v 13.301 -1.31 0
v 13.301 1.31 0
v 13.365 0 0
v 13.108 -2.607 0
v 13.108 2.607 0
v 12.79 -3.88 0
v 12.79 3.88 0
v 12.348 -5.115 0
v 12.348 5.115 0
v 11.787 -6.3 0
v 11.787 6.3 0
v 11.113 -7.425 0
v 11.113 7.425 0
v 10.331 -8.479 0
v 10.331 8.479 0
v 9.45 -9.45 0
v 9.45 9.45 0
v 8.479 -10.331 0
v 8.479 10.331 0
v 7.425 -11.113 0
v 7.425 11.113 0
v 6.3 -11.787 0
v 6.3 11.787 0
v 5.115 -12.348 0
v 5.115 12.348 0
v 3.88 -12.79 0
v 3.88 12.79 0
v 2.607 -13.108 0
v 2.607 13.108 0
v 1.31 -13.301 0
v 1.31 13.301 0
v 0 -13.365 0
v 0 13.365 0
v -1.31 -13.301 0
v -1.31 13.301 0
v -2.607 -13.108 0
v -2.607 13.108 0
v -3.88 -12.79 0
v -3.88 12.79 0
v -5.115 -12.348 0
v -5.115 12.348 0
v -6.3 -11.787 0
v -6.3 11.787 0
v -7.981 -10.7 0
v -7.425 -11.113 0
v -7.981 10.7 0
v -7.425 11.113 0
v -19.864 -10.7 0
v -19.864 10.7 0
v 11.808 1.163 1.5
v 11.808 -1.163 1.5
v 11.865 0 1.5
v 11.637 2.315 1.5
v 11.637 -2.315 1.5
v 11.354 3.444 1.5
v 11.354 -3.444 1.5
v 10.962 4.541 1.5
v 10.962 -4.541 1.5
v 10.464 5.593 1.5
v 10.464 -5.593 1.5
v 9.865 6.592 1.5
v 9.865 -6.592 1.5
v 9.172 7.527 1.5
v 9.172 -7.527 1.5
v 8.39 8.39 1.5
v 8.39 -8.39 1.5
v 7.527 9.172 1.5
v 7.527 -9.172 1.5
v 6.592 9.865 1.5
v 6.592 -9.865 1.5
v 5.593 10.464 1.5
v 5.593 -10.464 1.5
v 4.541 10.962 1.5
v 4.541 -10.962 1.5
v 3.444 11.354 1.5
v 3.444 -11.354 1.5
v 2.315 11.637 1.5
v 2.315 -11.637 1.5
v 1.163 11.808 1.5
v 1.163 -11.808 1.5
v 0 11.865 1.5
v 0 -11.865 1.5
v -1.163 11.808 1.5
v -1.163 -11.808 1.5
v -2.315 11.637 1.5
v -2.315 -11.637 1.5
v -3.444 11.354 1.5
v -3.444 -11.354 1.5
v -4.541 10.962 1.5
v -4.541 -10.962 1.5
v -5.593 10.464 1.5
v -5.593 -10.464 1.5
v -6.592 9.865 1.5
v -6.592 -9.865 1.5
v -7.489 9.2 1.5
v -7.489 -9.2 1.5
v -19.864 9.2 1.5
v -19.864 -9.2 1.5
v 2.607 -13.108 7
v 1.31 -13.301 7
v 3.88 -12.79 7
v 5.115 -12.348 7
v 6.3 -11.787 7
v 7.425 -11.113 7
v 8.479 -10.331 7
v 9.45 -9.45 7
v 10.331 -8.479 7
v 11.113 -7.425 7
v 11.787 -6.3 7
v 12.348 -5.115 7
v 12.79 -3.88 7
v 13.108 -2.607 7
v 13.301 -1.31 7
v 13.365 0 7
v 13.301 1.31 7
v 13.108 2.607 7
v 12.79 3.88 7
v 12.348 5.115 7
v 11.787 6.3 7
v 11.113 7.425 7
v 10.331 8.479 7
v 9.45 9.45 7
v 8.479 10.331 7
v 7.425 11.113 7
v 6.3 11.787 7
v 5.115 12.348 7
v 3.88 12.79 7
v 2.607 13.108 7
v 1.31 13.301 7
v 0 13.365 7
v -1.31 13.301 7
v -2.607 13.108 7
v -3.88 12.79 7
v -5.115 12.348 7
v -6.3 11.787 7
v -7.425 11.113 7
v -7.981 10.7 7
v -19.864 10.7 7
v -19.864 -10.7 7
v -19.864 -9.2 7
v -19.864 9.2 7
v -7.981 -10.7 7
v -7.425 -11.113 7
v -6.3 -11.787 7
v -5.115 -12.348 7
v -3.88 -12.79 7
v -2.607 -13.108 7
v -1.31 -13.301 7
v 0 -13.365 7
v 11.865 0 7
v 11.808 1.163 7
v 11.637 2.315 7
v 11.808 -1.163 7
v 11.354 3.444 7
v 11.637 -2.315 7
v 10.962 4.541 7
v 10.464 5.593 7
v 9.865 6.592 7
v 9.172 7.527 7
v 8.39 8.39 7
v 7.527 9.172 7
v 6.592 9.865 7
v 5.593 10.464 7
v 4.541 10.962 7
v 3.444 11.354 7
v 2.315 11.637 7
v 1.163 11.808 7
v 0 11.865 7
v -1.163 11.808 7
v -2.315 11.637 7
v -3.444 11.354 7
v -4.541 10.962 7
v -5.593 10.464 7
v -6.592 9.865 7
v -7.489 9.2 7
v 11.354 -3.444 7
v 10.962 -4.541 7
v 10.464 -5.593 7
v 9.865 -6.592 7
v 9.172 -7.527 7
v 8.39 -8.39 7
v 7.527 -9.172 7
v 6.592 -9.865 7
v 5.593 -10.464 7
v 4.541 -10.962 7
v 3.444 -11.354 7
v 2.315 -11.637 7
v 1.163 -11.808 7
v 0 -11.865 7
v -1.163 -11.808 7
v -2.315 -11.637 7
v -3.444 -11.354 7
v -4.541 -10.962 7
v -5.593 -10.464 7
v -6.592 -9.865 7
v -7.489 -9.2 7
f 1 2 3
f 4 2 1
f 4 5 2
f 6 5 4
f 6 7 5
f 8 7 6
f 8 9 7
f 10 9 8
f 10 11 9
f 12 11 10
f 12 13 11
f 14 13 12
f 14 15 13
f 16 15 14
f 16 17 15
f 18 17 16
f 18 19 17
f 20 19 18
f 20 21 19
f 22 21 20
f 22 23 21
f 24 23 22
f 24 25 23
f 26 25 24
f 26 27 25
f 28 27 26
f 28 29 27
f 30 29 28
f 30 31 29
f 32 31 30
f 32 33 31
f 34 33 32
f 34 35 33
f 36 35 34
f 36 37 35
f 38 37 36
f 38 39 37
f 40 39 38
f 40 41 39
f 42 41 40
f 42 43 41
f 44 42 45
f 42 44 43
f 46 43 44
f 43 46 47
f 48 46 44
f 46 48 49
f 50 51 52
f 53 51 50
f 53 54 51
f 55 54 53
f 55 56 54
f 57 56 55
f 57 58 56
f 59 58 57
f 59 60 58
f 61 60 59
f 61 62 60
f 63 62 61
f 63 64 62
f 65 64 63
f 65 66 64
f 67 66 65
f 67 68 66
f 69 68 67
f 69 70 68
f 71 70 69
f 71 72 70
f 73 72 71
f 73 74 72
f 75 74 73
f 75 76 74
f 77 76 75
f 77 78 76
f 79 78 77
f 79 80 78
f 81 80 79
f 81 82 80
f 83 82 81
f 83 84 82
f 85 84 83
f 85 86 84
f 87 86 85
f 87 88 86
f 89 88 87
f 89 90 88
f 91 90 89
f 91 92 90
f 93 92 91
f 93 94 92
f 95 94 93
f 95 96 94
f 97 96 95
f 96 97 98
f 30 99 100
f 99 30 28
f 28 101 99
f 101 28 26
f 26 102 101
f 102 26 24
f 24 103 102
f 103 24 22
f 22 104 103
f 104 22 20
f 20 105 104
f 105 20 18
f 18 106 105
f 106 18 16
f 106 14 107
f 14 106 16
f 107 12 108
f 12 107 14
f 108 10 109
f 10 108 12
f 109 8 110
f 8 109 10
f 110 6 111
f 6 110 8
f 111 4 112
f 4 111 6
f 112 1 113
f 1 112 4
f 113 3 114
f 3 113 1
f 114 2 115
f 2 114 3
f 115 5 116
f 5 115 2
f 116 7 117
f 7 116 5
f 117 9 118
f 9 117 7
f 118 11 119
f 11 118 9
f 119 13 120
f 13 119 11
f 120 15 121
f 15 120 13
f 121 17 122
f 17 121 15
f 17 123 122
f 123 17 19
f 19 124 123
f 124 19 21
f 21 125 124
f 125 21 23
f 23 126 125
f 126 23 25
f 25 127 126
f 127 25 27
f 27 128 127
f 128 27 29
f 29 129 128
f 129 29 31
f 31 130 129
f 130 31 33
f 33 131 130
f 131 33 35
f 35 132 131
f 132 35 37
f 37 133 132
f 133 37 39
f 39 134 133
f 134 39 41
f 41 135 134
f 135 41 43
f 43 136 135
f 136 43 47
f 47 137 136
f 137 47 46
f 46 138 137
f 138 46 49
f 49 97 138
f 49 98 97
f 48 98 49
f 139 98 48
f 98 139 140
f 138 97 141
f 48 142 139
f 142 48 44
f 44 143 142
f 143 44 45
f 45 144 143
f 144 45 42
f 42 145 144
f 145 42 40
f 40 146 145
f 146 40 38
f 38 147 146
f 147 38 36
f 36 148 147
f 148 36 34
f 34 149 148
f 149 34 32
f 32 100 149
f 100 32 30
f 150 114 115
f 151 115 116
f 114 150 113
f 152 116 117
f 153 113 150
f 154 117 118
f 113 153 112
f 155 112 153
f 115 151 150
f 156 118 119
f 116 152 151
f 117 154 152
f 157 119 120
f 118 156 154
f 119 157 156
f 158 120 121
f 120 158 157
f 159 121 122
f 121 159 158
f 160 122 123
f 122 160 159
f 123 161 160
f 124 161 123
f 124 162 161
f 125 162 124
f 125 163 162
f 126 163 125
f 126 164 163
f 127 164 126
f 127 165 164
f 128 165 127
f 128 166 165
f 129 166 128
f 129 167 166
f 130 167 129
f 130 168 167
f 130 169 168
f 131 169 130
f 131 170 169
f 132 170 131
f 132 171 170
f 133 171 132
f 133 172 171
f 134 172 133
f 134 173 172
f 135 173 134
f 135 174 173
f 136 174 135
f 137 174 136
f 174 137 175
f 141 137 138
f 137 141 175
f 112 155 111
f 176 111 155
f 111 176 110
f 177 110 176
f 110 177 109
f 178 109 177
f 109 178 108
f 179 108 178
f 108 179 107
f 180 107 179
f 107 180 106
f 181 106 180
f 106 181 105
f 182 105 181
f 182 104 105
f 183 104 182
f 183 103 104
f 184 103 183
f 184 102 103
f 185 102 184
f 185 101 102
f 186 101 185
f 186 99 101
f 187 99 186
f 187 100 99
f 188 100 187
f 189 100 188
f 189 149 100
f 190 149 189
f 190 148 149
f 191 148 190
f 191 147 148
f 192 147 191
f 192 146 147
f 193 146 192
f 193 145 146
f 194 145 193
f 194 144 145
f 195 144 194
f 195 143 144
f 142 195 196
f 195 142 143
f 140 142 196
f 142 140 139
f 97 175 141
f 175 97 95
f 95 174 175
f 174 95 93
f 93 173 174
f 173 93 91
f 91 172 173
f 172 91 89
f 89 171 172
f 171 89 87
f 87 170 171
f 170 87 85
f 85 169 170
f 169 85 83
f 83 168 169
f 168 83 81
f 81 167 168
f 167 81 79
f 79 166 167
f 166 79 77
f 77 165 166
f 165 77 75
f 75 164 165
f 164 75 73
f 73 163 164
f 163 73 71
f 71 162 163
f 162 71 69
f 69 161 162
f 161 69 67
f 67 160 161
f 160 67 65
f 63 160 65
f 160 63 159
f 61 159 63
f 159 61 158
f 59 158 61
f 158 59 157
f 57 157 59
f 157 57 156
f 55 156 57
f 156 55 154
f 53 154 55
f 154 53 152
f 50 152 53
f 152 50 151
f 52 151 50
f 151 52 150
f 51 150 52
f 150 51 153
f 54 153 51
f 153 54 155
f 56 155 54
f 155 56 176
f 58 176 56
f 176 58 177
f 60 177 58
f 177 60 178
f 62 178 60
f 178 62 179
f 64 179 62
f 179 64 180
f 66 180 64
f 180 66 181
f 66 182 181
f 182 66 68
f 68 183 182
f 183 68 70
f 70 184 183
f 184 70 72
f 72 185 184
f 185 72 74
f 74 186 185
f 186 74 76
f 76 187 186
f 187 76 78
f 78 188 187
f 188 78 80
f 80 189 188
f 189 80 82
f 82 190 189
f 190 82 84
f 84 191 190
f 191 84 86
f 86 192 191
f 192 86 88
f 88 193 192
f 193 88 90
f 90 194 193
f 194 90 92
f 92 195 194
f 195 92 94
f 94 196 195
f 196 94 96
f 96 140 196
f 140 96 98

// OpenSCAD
diameter = 23.73;
strapLength = 8;
strapWidth = 18.4;
depth = 5.5;
wall = 1.5;

$fn = 64;

module shape(offset=0) {
    w = strapWidth + 2*offset;
    translate([-strapLength-diameter/2-(offset>0?-.001:0),-w/2]) square([strapLength+diameter/2,w]);
    circle(d=diameter+2*offset);
}

linear_extrude(height=wall) shape(wall);
linear_extrude(height=wall+depth) difference() {
    shape(wall);
    shape();
}
